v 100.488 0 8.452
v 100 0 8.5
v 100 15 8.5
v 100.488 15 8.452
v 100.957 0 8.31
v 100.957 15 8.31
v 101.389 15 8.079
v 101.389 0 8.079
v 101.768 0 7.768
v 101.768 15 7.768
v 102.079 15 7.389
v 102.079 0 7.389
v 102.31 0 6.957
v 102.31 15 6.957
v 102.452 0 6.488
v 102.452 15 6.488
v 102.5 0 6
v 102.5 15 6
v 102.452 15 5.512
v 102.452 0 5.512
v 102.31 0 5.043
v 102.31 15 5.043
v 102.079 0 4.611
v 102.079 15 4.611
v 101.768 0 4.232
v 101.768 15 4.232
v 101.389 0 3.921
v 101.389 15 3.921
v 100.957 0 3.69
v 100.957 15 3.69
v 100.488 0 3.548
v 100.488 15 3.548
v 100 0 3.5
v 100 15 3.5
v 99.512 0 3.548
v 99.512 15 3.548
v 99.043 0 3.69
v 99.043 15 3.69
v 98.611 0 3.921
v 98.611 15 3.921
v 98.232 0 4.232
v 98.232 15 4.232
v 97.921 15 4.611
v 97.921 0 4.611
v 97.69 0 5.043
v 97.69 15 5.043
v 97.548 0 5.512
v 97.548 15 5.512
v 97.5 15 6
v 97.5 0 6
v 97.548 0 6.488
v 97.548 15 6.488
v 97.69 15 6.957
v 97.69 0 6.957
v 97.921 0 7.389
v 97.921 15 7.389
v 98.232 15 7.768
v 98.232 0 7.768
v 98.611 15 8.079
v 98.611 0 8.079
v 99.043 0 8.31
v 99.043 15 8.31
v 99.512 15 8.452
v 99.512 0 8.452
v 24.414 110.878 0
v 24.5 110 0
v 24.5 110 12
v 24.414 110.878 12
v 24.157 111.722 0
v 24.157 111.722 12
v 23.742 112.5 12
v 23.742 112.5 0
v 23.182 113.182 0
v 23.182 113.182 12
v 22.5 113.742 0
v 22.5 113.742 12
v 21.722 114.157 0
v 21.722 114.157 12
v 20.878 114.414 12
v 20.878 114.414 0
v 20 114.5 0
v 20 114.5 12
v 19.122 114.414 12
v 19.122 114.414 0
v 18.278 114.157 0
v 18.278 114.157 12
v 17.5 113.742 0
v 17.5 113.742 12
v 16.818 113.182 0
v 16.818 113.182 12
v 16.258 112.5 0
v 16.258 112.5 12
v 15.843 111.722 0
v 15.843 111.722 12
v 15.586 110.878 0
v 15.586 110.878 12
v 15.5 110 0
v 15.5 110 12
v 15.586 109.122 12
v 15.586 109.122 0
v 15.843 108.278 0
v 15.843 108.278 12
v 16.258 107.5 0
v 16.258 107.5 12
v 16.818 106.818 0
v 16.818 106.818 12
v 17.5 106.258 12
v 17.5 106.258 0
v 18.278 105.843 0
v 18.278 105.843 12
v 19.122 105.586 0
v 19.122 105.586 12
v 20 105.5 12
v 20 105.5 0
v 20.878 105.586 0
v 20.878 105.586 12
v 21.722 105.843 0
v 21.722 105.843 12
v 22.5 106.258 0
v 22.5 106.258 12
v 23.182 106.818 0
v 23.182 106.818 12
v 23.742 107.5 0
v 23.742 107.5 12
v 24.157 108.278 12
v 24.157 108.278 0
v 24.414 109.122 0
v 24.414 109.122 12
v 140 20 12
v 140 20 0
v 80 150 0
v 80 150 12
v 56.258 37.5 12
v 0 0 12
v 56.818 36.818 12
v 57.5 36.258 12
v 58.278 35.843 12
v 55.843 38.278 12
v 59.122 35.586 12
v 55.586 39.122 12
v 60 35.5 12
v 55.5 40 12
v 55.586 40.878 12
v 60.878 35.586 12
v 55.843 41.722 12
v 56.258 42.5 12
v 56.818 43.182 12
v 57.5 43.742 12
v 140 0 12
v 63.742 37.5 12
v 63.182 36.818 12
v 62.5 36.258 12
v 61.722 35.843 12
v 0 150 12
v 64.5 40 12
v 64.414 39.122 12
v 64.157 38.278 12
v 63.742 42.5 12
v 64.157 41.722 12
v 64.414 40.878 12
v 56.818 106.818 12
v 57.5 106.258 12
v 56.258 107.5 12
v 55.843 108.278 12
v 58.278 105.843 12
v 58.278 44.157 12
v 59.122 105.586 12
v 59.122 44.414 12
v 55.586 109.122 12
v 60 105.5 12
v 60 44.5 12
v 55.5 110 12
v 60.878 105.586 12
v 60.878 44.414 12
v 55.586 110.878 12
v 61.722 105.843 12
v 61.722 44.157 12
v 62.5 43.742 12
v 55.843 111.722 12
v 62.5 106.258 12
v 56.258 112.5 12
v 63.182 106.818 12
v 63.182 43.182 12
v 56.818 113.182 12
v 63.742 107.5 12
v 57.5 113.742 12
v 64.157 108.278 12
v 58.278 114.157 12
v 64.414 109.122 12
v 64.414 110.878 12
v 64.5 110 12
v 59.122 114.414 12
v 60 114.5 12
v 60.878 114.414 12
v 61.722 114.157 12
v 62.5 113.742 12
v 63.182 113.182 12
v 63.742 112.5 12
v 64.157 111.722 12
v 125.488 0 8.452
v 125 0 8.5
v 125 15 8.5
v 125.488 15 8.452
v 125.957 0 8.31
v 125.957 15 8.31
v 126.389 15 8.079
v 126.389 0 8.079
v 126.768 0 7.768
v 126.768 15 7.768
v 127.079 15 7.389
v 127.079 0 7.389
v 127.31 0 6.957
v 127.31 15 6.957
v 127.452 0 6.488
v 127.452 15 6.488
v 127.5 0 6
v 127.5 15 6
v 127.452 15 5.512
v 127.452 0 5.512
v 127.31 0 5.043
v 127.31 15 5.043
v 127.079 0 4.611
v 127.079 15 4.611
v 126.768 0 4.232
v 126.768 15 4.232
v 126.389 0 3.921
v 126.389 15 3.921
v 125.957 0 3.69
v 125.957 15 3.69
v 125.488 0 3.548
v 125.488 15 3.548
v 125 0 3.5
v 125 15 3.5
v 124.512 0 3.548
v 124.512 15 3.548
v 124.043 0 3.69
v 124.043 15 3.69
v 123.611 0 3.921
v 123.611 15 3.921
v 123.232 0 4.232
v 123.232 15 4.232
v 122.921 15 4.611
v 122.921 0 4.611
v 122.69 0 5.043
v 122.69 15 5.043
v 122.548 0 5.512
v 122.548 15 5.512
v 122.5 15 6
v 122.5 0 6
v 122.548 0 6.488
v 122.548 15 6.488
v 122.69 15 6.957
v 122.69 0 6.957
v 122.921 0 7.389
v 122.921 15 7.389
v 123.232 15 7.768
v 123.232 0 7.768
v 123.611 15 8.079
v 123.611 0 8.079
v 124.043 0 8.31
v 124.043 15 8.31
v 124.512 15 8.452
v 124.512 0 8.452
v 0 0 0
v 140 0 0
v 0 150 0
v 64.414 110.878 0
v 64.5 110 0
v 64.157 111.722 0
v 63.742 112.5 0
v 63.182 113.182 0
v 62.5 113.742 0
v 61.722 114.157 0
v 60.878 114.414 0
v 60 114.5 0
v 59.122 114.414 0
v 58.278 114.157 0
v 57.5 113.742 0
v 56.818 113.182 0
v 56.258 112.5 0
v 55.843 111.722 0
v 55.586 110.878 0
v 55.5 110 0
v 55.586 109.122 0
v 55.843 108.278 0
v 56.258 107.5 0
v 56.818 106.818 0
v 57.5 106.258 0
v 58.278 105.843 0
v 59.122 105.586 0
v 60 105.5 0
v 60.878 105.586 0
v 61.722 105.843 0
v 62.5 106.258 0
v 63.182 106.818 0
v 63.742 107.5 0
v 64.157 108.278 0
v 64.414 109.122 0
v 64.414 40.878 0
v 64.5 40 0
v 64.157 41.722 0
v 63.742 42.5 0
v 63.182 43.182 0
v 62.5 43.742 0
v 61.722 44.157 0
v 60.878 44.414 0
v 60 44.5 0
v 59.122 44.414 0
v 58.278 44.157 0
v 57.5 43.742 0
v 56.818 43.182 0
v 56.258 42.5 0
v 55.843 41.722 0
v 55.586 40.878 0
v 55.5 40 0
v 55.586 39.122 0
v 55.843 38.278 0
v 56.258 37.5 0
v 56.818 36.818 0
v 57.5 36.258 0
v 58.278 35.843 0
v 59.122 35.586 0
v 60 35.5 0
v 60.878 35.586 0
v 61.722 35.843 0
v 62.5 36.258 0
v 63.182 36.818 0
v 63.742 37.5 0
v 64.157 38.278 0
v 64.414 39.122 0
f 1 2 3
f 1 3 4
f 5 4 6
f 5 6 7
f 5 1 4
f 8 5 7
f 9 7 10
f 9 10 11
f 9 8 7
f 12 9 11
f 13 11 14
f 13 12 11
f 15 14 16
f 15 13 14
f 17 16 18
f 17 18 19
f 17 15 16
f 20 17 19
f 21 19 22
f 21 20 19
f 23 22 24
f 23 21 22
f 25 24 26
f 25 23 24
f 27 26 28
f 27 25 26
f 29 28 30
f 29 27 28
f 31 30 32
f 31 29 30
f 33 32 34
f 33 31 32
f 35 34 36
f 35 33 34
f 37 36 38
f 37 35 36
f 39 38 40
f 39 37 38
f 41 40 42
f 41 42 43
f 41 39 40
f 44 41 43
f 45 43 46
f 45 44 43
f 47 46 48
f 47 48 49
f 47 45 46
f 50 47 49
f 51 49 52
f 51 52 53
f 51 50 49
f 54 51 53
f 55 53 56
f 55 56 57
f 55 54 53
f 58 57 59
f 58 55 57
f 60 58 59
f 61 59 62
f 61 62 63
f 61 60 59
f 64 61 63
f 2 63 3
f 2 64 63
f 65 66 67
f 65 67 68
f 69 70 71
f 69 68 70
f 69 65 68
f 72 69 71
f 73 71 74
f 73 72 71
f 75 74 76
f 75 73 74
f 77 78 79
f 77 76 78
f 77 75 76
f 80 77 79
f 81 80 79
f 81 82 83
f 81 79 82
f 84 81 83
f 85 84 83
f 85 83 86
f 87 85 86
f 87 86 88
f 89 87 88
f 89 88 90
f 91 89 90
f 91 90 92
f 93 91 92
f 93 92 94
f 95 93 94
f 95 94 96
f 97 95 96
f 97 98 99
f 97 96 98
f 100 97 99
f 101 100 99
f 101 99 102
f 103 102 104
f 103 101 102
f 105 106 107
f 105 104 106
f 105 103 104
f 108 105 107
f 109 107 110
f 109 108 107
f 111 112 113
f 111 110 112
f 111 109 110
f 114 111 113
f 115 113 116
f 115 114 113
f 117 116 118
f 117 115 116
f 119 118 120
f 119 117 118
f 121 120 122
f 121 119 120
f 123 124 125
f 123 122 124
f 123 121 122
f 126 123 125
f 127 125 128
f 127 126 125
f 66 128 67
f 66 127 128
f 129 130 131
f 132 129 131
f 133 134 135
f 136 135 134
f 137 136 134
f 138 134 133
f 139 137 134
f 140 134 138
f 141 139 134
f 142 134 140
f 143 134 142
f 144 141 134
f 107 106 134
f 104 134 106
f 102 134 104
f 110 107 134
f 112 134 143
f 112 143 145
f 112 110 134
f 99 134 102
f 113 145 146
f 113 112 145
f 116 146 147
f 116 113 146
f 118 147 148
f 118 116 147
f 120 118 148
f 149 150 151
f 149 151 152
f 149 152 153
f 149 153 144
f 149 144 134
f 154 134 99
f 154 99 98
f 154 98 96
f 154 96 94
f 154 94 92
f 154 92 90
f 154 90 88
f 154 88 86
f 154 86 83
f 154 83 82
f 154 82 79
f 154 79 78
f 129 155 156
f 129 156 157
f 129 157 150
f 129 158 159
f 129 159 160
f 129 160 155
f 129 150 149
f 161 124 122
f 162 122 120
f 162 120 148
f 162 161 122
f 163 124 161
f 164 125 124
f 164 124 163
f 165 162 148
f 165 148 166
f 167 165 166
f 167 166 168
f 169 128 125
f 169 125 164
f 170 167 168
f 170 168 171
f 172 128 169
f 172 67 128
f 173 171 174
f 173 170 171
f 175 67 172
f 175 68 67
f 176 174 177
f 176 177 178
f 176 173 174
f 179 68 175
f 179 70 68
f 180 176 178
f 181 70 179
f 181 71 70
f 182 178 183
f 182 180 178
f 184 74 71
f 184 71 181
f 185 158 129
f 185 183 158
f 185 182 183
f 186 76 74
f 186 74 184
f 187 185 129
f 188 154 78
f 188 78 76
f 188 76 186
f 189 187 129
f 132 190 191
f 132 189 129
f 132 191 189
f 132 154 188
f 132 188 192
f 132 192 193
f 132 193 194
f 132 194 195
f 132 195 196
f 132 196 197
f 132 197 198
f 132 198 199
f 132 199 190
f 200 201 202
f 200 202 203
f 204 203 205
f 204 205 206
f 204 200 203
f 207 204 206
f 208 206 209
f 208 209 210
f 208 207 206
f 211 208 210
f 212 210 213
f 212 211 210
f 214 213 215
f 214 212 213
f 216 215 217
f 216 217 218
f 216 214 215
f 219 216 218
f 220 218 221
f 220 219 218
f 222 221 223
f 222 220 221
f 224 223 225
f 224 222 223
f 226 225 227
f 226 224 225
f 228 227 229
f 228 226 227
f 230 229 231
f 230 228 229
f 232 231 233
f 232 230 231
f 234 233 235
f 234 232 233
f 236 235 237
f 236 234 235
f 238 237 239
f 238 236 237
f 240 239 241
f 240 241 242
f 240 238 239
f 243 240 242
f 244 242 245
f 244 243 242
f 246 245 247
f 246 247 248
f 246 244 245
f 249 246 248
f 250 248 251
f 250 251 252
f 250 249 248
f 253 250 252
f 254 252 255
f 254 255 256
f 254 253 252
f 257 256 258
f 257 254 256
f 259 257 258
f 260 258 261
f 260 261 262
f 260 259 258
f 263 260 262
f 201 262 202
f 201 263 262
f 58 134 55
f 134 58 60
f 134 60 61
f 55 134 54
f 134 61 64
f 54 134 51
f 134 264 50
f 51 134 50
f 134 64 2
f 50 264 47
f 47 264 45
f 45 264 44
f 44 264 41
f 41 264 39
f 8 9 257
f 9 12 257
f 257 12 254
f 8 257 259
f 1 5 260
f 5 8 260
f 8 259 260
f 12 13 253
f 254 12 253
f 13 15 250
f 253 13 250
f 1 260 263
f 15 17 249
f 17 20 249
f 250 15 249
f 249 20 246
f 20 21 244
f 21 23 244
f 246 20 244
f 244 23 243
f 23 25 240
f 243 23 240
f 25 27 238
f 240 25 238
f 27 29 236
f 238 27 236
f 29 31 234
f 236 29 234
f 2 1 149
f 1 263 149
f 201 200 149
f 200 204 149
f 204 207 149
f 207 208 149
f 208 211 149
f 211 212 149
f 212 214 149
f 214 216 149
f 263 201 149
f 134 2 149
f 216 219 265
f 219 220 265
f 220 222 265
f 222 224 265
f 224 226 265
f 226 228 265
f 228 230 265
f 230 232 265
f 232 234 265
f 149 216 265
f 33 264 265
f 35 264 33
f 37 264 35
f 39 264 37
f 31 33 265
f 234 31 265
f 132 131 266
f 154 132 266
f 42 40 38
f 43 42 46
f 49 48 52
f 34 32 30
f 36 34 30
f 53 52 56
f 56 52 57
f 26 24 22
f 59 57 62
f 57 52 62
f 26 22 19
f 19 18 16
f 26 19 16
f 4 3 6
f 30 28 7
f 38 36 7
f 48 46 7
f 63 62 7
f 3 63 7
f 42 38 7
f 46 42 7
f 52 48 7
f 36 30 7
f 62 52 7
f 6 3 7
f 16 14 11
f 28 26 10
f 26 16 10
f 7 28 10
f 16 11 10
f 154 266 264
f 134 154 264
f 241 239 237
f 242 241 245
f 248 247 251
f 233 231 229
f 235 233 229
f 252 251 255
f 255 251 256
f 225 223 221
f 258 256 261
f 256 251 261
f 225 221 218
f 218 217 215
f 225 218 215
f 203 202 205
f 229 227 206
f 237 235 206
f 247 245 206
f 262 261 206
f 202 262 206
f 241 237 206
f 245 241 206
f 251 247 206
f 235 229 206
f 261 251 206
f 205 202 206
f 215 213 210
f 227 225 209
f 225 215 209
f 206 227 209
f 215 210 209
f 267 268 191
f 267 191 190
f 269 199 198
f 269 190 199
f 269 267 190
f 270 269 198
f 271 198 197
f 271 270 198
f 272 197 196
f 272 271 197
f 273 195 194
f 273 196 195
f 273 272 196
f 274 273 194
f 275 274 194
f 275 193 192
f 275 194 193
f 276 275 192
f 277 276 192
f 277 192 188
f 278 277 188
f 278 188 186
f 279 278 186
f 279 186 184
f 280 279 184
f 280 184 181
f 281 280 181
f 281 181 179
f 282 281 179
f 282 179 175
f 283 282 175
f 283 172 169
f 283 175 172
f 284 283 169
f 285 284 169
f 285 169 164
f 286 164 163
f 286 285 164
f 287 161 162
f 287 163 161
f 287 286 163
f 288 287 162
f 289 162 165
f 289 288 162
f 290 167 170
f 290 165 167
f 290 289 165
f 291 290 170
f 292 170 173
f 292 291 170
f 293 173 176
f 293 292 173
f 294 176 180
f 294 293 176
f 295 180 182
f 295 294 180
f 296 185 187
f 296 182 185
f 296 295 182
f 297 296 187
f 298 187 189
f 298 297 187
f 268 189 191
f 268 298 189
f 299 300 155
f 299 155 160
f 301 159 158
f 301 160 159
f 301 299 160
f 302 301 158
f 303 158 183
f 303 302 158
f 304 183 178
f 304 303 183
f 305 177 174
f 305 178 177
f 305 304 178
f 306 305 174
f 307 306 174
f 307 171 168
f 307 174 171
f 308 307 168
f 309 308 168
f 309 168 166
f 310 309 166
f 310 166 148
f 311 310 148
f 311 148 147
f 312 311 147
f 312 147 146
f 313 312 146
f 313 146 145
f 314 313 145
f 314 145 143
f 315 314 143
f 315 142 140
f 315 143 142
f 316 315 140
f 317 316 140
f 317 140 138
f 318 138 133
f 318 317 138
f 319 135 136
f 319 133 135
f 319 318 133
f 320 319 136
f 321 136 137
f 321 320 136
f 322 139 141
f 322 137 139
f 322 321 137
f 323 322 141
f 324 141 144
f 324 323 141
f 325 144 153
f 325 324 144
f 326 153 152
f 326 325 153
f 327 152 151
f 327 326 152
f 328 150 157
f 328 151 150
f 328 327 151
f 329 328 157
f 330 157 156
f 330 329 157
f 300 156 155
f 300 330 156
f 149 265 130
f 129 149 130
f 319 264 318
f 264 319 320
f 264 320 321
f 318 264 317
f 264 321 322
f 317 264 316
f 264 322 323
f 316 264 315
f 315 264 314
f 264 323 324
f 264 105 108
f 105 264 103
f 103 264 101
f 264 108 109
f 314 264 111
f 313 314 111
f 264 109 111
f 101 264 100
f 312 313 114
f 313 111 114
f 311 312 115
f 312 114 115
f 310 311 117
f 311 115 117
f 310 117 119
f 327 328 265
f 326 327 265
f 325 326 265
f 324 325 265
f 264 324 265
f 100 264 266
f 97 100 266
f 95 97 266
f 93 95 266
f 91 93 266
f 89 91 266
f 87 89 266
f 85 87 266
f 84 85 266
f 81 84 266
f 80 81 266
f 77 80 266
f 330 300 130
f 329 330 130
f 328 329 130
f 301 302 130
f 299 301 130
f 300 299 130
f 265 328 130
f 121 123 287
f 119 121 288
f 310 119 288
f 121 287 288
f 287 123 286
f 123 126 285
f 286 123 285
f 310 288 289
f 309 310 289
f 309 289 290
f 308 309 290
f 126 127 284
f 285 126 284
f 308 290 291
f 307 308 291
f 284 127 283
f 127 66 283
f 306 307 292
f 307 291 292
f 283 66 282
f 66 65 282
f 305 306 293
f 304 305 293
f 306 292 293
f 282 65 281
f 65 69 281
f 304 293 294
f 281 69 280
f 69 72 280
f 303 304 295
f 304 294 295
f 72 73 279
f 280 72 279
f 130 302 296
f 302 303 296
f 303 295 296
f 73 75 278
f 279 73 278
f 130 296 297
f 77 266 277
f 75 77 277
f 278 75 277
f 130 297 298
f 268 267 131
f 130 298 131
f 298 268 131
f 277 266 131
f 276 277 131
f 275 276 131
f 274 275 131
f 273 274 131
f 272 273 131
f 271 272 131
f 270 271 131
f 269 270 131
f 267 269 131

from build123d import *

# Parameters (mm, degrees)
BOSS_EXTRUDE1_DEPTH     = 12
CUT_EXTRUDE1_DEPTH      = 206.533452265
CUT_EXTRUDE1_DEPTH_BACK = 206.533452265
SKETCH2_R               = 4.5
SKETCH3_R               = 2.5
CUT_EXTRUDE3_DEPTH      = 15


with BuildPart() as part:
    # Sketch1 → Boss-Extrude1 (new body)
    with BuildSketch(Plane.XY):
        Polygon((0, 0), (140, 0), (140, 20), (80, 150), (0, 150), align=None)
    extrude(amount=BOSS_EXTRUDE1_DEPTH)

    # Sketch2 → Cut-Extrude1 (cut, two sides: drawn at the far end of the back side and taken through both)
    with BuildSketch(Plane.XY.offset(-CUT_EXTRUDE1_DEPTH_BACK)):
        with Locations((20, 110)):
            Circle(SKETCH2_R)
        with Locations((60, 110)):
            Circle(SKETCH2_R)
        with Locations((60, 40)):
            Circle(SKETCH2_R)
    extrude(amount=CUT_EXTRUDE1_DEPTH + CUT_EXTRUDE1_DEPTH_BACK, mode=Mode.SUBTRACT)

    # Sketch3 → Cut-Extrude3 (cut)
    with BuildSketch(Plane(origin=(0, 0, 0), x_dir=(1, 0, 0), z_dir=(0, 1, 0))):
        with Locations(Location((100, -6, 0), (0, 0, 270))):
            Circle(SKETCH3_R)
        with Locations(Location((125, -6, 0), (0, 0, 270))):
            Circle(SKETCH3_R)
    extrude(amount=CUT_EXTRUDE3_DEPTH, mode=Mode.SUBTRACT)


solid = part.part
